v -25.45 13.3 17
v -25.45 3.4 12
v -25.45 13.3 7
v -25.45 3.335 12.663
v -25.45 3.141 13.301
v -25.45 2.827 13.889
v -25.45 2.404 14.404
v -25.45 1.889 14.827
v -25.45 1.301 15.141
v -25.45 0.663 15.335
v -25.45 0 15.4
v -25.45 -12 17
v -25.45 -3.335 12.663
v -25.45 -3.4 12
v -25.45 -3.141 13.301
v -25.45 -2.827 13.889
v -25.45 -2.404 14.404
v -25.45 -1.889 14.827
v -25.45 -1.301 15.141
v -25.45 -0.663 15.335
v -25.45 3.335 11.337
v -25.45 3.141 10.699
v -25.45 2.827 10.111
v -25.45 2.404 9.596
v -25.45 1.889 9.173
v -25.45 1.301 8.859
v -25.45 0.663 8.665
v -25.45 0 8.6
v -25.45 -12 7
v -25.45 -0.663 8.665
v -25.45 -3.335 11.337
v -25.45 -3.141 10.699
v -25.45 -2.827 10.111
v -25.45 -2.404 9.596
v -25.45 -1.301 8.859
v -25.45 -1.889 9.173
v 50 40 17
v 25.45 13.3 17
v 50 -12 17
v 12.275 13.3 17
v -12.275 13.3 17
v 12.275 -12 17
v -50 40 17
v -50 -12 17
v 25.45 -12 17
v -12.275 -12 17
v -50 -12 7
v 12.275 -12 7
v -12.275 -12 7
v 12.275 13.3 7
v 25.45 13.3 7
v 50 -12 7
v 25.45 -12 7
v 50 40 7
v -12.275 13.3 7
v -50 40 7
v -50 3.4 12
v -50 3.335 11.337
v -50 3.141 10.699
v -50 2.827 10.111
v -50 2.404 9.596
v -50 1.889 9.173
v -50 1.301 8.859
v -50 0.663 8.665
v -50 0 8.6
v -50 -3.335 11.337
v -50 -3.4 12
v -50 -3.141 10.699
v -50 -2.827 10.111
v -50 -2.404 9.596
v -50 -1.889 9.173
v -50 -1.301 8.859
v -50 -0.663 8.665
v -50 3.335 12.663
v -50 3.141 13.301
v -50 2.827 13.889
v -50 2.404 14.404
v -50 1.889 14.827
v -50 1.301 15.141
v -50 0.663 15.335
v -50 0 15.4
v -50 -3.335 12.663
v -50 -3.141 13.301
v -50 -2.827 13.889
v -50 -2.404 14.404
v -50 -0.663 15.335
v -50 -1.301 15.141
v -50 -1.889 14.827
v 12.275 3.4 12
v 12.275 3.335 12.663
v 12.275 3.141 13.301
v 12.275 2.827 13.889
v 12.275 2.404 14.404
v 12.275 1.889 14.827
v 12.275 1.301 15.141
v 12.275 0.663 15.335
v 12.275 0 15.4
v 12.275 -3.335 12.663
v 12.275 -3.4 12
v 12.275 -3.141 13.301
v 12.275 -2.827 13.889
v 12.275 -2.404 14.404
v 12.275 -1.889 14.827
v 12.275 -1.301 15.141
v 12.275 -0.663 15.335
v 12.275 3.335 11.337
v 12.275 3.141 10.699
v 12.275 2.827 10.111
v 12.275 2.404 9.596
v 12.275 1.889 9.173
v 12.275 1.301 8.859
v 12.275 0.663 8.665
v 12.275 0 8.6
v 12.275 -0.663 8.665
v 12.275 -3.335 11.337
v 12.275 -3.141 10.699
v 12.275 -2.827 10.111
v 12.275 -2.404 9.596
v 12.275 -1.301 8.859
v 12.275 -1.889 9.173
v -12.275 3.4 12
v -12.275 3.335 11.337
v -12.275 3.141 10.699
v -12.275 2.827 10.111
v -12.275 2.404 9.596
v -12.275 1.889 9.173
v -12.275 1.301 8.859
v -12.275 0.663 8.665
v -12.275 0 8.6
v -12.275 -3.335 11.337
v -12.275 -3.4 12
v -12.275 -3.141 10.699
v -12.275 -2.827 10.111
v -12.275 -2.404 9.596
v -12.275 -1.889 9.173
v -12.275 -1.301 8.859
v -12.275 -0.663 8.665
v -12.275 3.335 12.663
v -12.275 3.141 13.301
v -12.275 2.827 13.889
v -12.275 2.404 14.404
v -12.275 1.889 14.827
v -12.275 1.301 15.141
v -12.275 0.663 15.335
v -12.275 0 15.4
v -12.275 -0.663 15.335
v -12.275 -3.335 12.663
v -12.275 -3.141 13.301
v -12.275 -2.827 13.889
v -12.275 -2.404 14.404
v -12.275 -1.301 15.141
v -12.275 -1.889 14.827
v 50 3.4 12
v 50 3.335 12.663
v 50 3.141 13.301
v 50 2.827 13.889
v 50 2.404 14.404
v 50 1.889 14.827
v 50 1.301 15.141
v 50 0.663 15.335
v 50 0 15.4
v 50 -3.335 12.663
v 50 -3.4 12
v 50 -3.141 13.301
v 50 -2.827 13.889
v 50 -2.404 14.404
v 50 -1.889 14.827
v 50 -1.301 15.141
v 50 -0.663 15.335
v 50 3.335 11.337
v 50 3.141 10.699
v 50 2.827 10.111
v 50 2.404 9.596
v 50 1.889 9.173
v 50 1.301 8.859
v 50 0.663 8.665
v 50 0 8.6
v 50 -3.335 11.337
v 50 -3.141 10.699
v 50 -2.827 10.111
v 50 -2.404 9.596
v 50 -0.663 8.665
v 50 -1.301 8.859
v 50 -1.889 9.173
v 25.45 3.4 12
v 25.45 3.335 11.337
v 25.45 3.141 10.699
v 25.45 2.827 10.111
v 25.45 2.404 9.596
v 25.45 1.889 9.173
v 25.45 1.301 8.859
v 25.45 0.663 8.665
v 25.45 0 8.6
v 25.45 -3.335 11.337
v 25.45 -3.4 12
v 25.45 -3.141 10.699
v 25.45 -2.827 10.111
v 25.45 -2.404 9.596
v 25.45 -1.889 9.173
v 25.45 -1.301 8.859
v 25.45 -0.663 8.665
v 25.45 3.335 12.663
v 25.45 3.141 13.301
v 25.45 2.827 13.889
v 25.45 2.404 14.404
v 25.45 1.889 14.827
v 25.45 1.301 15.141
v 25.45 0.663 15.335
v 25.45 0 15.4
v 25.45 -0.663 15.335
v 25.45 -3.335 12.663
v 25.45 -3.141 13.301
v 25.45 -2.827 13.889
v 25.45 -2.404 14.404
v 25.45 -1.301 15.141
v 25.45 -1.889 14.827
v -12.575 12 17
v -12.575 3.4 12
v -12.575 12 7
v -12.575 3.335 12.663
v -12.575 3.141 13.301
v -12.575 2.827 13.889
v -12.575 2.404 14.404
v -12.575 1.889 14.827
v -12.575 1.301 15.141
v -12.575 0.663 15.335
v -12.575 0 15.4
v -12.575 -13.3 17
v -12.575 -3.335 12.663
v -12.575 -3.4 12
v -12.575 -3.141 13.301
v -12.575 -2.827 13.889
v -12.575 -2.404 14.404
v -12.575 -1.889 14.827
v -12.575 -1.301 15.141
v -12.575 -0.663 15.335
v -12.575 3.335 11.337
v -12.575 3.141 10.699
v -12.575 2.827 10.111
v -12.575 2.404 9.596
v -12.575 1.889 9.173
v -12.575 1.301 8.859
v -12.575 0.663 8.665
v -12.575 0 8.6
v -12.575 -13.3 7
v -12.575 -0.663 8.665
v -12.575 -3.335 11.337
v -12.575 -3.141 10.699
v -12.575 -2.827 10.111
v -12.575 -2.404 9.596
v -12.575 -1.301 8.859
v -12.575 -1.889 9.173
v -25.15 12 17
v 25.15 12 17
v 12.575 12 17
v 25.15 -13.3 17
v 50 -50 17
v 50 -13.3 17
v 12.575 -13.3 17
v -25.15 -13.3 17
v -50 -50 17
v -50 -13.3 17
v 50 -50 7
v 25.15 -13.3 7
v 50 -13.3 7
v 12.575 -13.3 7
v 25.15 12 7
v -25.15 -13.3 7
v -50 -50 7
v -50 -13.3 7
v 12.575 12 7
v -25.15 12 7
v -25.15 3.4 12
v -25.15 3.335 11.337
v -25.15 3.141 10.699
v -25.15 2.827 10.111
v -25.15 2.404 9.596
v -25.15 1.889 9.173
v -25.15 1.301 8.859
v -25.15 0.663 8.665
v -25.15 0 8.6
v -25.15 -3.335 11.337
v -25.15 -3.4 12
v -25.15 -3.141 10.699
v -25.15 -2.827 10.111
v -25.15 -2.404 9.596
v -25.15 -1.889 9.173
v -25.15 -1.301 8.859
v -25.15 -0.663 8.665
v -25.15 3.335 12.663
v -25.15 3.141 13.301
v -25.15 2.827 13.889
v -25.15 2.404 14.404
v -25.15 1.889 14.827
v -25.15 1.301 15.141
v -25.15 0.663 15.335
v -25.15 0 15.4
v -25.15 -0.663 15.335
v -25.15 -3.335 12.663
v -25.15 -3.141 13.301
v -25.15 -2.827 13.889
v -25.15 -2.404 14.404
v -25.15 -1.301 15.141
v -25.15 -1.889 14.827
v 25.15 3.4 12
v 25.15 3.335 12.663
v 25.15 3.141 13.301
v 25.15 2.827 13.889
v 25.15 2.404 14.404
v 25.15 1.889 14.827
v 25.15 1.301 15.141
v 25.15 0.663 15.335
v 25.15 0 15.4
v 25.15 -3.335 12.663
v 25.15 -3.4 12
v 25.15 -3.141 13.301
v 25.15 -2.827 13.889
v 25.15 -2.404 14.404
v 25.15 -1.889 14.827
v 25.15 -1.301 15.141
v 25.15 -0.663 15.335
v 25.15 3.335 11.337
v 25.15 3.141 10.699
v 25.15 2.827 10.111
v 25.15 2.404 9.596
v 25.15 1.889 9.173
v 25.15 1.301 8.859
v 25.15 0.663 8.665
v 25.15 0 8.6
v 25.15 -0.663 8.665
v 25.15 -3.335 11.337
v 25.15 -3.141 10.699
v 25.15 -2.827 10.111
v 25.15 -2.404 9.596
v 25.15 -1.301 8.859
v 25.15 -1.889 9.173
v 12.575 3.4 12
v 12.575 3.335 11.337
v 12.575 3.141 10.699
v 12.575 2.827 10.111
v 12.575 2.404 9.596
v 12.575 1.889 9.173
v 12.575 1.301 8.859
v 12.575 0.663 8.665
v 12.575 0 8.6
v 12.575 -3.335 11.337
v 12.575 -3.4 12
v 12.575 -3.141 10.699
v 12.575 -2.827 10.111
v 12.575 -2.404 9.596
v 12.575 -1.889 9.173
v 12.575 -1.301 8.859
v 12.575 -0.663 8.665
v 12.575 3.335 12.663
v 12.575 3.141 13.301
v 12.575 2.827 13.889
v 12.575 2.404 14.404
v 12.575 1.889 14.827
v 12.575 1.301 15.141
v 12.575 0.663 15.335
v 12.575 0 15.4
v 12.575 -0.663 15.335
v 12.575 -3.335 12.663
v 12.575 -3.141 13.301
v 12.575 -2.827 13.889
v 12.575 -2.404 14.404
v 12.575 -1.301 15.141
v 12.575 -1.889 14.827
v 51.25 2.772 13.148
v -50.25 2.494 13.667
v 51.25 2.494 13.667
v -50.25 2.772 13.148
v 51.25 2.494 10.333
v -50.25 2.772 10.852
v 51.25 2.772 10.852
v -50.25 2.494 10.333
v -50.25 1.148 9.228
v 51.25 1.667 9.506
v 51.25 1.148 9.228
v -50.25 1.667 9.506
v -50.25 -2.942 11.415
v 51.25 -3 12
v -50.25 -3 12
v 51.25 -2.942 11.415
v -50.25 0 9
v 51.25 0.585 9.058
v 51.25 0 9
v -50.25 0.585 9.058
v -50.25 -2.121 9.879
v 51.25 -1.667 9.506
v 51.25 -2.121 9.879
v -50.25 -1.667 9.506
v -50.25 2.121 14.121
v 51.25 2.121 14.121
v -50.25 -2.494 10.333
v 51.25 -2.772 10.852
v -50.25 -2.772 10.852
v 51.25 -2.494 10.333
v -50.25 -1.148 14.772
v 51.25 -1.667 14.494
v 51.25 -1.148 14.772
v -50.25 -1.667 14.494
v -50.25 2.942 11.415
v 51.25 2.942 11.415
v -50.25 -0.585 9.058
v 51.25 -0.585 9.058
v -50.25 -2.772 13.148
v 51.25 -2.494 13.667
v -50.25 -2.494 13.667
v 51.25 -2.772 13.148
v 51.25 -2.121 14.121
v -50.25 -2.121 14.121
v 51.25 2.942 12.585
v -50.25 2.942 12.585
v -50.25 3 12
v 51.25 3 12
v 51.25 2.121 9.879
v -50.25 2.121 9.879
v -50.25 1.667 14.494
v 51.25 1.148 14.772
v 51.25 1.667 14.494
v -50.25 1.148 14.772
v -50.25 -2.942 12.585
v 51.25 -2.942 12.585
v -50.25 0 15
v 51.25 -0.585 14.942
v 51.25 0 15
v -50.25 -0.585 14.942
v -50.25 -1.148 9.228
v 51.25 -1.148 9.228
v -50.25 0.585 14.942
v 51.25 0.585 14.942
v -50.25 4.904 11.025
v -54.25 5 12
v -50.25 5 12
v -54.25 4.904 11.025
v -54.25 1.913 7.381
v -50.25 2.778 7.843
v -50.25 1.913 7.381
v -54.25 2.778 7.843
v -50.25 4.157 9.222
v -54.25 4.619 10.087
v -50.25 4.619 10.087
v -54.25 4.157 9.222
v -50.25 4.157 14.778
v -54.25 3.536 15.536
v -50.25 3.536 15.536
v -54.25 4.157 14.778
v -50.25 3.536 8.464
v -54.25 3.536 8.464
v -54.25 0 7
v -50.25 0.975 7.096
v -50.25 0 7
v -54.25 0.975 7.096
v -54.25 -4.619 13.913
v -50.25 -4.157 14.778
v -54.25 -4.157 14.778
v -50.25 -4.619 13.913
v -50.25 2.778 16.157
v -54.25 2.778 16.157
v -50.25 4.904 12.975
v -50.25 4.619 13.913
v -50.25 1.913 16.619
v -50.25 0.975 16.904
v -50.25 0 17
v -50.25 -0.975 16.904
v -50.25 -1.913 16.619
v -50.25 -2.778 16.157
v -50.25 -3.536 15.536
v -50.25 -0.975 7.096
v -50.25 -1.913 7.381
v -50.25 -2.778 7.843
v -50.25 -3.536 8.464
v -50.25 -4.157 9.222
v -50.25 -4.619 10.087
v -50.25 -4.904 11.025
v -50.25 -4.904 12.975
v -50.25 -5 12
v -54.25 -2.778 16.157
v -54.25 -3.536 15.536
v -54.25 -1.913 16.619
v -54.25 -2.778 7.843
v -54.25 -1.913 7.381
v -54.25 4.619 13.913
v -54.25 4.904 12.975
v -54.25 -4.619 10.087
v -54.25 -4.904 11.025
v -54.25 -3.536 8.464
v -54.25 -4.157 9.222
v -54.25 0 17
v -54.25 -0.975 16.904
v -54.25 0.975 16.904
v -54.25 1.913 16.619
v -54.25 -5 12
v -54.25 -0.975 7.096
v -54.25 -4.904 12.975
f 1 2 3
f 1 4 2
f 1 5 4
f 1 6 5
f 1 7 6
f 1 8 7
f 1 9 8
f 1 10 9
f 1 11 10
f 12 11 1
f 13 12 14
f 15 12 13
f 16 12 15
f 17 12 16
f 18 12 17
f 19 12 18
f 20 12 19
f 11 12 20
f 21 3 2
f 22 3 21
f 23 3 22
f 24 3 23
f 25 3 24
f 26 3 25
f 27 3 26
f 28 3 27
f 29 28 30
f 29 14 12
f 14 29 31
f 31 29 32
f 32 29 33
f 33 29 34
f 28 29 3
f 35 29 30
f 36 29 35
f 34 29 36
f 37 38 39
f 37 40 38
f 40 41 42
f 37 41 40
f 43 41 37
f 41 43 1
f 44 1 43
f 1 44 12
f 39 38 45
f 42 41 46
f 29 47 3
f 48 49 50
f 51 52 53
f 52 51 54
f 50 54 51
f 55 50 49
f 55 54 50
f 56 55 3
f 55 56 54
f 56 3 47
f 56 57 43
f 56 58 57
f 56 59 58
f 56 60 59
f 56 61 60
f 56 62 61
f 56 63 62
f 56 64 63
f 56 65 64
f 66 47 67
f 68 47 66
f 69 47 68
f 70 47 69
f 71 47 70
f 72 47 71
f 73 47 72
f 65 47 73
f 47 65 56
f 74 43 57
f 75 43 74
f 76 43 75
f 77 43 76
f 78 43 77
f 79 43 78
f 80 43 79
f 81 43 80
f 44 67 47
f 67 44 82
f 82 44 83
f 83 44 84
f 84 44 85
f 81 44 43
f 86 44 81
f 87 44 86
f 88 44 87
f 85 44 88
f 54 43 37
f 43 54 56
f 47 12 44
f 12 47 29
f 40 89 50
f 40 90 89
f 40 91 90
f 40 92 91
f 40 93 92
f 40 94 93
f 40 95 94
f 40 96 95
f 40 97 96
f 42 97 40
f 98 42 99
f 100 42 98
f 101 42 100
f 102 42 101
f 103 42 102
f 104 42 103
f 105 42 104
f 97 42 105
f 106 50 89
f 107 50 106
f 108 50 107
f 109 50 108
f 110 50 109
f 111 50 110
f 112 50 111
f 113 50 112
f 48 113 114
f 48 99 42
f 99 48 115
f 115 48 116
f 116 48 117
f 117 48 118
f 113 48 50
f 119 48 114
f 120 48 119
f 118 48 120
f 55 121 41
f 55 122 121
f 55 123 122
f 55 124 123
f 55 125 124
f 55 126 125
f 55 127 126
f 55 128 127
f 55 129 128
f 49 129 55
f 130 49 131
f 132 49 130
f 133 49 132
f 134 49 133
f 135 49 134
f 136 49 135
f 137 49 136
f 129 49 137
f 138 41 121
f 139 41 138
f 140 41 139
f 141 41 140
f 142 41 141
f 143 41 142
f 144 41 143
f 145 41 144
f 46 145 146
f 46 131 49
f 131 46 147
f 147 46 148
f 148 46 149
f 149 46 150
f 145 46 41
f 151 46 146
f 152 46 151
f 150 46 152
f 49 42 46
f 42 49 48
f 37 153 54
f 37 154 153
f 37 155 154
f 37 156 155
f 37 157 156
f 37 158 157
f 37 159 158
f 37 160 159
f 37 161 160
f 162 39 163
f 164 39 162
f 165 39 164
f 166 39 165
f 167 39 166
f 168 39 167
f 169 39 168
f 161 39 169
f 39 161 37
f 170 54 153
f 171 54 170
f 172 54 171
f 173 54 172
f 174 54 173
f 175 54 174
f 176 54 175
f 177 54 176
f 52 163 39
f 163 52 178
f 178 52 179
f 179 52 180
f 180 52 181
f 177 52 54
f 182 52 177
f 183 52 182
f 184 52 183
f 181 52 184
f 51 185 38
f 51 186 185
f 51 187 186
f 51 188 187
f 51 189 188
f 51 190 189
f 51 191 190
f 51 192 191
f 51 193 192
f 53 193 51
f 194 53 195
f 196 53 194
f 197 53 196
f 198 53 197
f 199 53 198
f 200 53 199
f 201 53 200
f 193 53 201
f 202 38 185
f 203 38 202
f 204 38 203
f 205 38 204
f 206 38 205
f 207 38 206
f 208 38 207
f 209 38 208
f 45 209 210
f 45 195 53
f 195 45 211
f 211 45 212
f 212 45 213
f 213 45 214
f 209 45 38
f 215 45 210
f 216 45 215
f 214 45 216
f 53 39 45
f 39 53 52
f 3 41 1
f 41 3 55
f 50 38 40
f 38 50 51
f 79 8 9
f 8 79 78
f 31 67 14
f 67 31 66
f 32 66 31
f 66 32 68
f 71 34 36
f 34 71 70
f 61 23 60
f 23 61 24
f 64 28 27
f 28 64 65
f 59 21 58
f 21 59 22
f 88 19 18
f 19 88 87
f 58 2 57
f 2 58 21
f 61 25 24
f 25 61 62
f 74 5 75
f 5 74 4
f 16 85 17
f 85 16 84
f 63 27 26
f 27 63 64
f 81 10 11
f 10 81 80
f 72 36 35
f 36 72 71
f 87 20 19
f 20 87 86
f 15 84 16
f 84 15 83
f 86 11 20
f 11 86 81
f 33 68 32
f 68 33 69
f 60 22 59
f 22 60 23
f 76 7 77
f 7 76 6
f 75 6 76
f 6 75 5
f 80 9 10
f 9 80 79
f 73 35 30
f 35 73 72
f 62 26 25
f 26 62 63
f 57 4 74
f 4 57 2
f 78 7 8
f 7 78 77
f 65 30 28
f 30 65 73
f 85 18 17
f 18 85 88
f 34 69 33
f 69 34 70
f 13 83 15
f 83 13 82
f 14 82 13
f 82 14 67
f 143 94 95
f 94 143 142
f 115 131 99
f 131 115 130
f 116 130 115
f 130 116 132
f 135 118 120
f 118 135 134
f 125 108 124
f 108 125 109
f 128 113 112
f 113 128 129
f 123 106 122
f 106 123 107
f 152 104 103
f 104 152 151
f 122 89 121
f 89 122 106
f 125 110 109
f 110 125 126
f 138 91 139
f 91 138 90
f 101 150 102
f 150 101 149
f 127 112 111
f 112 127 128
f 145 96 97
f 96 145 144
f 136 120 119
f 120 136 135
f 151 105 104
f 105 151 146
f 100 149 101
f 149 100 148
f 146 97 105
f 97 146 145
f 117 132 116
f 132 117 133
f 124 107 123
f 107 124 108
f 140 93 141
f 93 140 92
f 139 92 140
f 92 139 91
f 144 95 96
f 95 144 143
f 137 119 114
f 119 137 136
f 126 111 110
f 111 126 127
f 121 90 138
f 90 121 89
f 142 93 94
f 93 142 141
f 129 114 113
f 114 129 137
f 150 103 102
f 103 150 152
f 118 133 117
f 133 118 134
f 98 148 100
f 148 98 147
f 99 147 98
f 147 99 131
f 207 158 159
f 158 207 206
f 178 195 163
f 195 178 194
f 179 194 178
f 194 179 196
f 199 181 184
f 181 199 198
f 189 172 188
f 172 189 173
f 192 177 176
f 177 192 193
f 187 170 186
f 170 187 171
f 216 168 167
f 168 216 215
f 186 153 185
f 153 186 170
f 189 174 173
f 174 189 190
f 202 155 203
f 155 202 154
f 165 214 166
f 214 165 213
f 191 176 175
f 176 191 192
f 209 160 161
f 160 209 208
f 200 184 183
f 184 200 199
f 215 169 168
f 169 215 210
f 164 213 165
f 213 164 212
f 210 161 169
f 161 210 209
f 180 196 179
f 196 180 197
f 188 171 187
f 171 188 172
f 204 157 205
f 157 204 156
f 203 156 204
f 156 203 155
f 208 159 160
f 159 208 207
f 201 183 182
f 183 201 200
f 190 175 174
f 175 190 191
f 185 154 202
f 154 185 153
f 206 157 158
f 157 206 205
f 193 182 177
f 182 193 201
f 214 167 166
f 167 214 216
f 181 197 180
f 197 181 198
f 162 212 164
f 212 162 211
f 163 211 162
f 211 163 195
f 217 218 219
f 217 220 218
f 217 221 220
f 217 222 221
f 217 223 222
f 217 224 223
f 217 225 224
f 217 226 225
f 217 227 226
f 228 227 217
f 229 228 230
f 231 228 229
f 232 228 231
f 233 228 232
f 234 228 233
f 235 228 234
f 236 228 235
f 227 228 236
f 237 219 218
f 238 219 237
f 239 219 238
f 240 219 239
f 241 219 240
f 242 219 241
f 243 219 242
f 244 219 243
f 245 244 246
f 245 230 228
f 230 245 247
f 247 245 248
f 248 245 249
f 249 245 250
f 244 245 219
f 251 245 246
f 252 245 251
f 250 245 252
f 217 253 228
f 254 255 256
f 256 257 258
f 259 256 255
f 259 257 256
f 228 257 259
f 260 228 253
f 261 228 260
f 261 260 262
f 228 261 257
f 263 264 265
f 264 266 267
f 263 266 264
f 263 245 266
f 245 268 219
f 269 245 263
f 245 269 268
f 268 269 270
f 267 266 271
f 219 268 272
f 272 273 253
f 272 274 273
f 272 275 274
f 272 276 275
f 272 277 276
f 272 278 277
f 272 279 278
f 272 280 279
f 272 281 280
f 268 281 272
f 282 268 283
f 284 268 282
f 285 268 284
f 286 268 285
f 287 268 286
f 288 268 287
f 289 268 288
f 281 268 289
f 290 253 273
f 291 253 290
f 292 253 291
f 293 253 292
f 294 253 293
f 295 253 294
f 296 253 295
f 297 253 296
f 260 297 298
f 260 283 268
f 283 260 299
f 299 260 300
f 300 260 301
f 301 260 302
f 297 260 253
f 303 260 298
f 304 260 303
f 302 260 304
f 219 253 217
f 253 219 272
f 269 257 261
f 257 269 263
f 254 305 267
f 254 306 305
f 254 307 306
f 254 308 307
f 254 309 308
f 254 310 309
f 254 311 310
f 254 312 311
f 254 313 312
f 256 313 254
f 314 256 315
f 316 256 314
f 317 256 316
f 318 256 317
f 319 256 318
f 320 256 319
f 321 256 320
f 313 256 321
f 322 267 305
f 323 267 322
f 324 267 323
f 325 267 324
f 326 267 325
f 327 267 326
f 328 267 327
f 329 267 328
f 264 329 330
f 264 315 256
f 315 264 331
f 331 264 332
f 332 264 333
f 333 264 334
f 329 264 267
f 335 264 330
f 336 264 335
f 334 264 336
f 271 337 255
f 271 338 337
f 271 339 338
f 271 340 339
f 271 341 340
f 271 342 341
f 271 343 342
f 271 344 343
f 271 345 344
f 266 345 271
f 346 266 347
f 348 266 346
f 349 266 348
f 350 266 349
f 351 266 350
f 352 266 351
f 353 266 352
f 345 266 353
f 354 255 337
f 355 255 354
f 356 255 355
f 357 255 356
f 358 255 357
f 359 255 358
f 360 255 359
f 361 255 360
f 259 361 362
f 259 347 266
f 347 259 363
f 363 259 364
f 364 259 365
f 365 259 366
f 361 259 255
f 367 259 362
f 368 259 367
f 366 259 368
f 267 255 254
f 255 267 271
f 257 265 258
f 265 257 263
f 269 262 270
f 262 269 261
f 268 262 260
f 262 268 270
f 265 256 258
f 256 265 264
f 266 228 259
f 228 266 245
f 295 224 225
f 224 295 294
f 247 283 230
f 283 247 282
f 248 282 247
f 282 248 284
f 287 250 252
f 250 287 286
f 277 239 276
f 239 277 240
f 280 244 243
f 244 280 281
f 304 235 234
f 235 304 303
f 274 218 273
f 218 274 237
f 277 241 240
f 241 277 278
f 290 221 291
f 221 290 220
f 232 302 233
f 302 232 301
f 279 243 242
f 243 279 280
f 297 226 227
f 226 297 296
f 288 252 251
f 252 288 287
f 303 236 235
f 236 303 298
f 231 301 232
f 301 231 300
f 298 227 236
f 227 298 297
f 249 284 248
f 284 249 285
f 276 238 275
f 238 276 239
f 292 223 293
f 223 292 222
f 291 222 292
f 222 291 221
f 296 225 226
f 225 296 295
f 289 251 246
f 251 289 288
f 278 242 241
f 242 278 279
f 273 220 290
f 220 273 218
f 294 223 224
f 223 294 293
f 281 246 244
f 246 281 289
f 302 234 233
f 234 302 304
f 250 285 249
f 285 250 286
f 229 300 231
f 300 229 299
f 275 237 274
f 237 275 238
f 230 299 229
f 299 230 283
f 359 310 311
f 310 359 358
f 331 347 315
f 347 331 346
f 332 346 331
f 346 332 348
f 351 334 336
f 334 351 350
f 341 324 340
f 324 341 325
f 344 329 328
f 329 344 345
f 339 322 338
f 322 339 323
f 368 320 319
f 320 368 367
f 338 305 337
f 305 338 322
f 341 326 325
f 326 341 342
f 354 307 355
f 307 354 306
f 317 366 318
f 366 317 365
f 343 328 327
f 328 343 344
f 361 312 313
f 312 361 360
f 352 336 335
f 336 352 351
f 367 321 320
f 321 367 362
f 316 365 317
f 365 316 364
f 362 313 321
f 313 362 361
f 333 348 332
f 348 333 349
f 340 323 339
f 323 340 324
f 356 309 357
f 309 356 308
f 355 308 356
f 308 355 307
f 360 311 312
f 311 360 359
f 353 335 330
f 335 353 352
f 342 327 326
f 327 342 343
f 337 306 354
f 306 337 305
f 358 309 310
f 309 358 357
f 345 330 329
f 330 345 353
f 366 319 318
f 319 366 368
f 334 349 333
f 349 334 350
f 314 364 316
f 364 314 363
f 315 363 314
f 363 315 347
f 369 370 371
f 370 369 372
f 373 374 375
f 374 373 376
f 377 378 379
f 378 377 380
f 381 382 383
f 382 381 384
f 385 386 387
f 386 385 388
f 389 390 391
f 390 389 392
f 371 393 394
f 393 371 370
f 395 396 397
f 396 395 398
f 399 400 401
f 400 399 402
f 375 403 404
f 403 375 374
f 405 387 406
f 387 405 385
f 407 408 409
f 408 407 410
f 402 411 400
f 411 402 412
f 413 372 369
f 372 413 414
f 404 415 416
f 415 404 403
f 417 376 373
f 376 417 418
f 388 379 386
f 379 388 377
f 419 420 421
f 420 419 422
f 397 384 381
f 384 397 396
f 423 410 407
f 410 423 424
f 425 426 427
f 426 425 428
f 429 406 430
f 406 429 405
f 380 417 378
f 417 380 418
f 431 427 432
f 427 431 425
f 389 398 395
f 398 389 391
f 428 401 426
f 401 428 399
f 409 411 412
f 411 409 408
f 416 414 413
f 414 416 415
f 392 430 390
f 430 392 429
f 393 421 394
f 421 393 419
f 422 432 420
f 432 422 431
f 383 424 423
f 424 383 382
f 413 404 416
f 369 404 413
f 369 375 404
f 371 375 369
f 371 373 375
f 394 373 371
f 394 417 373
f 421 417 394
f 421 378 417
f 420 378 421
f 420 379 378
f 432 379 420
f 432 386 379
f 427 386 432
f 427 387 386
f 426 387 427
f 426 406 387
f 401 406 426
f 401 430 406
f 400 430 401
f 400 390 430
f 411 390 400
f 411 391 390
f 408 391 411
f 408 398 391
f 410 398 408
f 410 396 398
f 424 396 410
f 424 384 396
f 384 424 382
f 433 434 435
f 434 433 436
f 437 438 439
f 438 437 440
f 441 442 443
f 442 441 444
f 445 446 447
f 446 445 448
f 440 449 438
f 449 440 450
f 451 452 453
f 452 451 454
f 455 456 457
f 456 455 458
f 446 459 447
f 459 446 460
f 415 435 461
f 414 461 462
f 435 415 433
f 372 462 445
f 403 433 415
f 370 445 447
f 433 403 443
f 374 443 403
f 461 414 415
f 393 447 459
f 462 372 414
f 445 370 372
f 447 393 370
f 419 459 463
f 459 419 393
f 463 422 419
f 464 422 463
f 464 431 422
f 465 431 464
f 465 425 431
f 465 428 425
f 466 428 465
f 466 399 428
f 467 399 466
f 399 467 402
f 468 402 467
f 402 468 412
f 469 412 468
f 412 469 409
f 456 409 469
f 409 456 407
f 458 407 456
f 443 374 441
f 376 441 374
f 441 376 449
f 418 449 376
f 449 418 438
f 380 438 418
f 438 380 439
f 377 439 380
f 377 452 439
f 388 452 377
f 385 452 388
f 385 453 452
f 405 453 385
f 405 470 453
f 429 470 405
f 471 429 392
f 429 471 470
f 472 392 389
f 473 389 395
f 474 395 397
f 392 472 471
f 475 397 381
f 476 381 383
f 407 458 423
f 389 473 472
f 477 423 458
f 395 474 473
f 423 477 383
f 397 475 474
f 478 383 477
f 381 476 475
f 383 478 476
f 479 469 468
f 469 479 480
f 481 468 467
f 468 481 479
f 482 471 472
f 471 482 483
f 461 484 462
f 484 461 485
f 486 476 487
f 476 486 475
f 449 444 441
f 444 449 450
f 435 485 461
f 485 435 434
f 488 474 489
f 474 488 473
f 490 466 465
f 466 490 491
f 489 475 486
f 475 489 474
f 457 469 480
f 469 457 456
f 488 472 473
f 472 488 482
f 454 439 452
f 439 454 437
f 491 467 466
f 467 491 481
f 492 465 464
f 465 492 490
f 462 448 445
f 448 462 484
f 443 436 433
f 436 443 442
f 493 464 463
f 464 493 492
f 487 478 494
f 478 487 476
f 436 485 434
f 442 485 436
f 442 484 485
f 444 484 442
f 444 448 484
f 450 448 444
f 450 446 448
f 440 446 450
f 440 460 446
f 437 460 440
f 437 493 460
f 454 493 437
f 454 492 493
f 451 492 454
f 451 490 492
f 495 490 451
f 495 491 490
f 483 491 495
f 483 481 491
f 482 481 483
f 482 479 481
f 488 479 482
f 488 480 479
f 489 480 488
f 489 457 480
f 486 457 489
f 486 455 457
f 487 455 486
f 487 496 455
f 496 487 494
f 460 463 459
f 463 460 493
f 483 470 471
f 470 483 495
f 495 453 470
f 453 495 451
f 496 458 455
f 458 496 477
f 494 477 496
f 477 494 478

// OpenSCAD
$fn = 32;

// ------------------------------------------------------------------------
// Butt hinge: hinge 100 mm, leaf swung 0 deg
// Every part is its own module, assembly() places every instance.
// ------------------------------------------------------------------------

// --- part 1 ---
module hinge_base() {
  difference() {
    union() {
      translate([-50, -12, -5]) cube([24.55, 52, 10]);
      translate([-12.275, -12, -5]) cube([24.55, 52, 10]);
      translate([25.45, -12, -5]) cube([24.55, 52, 10]);
      translate([-50, 13.3, -5]) cube([100, 26.7, 10]);
    }
    translate([-37.725, 0, 0]) rotate([0, 90, 0]) cylinder(h = 26.55, d = 6.8, center = true);
    translate([0, 0, 0]) rotate([0, 90, 0]) cylinder(h = 26.55, d = 6.8, center = true);
    translate([37.725, 0, 0]) rotate([0, 90, 0]) cylinder(h = 26.55, d = 6.8, center = true);
  }
}

// --- part 2 ---
module hinge_mover() {
  difference() {
    union() {
      translate([-25.15, -50, -5]) cube([12.575, 62, 10]);
      translate([12.575, -50, -5]) cube([12.575, 62, 10]);
      translate([-50, -50, -5]) cube([100, 36.7, 10]);
    }
    translate([-18.863, 0, 0]) rotate([0, 90, 0]) cylinder(h = 14.575, d = 6.8, center = true);
    translate([18.863, 0, 0]) rotate([0, 90, 0]) cylinder(h = 14.575, d = 6.8, center = true);
  }
}

// --- part 3 ---
module hinge_pin() {
  rotate([0, 90, 0]) cylinder(h = 102.5, d = 6, center = true);
  translate([-54.25, 0, 0]) rotate([0, 90, 0]) cylinder(h = 4, d = 10);
}

// --- assembly ---
module assembly() {
  color([0.80, 0.24, 0.20]) translate([0, 0, 12]) rotate([0, 0, 0]) hinge_base();
  color([0.20, 0.45, 0.75]) translate([0, 0, 12]) rotate([0, 0, 0]) hinge_mover();
  color([0.25, 0.62, 0.32]) translate([0, 0, 12]) rotate([0, 0, 0]) hinge_pin();
}

assembly();
